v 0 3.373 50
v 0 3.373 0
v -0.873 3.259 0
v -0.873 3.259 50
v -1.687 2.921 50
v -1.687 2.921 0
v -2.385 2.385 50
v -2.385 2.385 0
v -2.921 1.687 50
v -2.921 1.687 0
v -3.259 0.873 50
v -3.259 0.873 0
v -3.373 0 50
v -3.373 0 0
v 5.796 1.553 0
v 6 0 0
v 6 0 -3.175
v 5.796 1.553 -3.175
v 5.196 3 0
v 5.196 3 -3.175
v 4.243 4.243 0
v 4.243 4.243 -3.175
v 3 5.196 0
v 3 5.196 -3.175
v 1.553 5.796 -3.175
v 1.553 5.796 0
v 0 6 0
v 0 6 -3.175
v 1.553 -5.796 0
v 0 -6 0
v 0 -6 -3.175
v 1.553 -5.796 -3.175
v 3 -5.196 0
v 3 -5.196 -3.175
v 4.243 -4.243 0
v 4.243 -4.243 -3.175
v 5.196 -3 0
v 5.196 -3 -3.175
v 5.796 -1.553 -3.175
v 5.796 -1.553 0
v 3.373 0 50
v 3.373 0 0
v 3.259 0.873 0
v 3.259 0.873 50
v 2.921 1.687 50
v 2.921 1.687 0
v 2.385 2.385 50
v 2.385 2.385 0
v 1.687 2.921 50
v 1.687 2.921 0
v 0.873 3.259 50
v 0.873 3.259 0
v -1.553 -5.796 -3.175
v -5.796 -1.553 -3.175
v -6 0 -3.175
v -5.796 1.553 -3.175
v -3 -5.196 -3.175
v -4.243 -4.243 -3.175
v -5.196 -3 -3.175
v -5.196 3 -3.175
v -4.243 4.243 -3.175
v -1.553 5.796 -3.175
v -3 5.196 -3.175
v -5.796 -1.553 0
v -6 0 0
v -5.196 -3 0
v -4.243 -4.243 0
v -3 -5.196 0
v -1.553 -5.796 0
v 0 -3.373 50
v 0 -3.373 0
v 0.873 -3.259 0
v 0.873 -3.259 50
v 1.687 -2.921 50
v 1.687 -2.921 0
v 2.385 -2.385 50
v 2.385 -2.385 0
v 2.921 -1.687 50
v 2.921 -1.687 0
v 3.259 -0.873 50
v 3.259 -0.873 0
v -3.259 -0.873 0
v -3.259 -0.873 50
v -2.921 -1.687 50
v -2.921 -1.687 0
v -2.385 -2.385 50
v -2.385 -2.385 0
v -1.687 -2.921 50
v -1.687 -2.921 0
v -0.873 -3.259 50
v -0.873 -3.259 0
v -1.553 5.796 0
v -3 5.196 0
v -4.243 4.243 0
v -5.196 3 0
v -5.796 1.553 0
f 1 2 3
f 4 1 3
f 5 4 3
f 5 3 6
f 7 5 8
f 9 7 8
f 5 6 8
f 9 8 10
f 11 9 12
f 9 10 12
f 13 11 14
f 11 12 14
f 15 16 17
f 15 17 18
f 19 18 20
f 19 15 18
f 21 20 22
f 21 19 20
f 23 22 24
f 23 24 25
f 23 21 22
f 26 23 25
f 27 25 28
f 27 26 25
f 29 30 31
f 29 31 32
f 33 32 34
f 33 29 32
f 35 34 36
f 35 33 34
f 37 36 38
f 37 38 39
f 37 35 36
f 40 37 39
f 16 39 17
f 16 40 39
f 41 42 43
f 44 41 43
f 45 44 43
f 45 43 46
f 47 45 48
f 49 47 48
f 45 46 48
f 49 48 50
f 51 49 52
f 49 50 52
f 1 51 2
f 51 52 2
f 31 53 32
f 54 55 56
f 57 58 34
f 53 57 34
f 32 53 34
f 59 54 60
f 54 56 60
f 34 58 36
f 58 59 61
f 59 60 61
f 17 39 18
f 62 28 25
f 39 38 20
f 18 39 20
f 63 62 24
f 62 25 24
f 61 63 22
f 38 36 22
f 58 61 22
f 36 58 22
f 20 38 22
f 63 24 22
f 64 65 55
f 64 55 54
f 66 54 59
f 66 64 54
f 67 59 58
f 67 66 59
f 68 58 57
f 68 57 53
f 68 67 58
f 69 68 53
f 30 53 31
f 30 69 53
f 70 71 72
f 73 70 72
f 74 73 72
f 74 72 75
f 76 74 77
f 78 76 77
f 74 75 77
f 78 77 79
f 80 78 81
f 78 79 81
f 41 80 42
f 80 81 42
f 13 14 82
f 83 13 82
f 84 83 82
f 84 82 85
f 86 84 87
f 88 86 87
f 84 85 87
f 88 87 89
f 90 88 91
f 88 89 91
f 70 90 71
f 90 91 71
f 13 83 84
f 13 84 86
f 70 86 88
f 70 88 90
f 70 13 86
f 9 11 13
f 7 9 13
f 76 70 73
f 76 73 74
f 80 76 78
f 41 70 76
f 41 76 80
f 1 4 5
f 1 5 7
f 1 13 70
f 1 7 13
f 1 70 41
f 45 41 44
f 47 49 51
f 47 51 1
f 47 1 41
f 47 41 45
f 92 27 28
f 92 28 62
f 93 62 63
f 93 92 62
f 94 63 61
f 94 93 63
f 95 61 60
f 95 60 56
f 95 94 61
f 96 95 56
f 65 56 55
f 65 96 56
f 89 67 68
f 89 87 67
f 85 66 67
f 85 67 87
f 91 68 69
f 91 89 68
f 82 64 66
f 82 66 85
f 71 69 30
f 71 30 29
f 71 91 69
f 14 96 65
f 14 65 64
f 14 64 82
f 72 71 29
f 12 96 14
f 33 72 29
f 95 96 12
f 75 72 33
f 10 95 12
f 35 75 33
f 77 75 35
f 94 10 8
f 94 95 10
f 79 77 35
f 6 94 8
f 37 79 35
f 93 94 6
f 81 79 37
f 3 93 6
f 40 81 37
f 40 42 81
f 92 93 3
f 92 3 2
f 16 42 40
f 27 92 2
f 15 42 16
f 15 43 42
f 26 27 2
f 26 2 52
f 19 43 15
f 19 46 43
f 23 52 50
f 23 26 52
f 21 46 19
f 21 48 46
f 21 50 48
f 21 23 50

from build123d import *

# Parameters (mm, degrees)
F1_DEPTH = 3.175
F3_DEPTH = 50


with BuildPart() as f1:
    # F0 (on Top) → F1 (new body)
    with BuildSketch(Plane.XY):
        with BuildLine():
            Line((0, 3.37345), (0, 6))
            ThreePointArc((0, 6), (-4.2426406871, 4.2426406871), (-6, 0))
            Line((-6, 0), (-3.37345, 0))
            ThreePointArc((-3.37345, 0), (-2.385389371, 2.385389371), (0, 3.37345))
        make_face()
        with BuildLine():
            Line((0, 0), (0, 3.37345))
            ThreePointArc((0, 3.37345), (-2.385389371, 2.385389371), (-3.37345, 0))
            Line((-3.37345, 0), (0, 0))
        make_face()
        with BuildLine():
            ThreePointArc((3.37345, 0), (2.385389371, 2.385389371), (0, 3.37345))
            Line((0, 3.37345), (0, 0))
            Line((0, 0), (3.37345, 0))
        make_face()
        with BuildLine():
            ThreePointArc((6, 0), (4.2426406871, 4.2426406871), (0, 6))
            Line((0, 6), (0, 3.37345))
            ThreePointArc((0, 3.37345), (2.385389371, 2.385389371), (3.37345, 0))
            Line((3.37345, 0), (6, 0))
        make_face()
        with BuildLine():
            ThreePointArc((0, -6), (4.2426406871, -4.2426406871), (6, 0))
            Line((6, 0), (3.37345, 0))
            ThreePointArc((3.37345, 0), (2.385389371, -2.385389371), (0, -3.37345))
            Line((0, -3.37345), (0, -6))
        make_face()
        with BuildLine():
            Line((3.37345, 0), (0, 0))
            Line((0, 0), (0, -3.37345))
            ThreePointArc((0, -3.37345), (2.385389371, -2.385389371), (3.37345, 0))
        make_face()
        with BuildLine():
            Line((0, -3.37345), (0, 0))
            Line((0, 0), (-3.37345, 0))
            ThreePointArc((-3.37345, 0), (-2.385389371, -2.385389371), (0, -3.37345))
        make_face()
        with BuildLine():
            Line((-3.37345, 0), (-6, 0))
            ThreePointArc((-6, 0), (-4.2426406871, -4.2426406871), (0, -6))
            Line((0, -6), (0, -3.37345))
            ThreePointArc((0, -3.37345), (-2.385389371, -2.385389371), (-3.37345, 0))
        make_face()
    extrude(amount=-F1_DEPTH)

    # F2 (on Top) → F3 (join)
    with BuildSketch(Plane.XY):
        with BuildLine():
            ThreePointArc((3.37345, 0), (2.385389371, 2.385389371), (0, 3.37345))
            Line((0, 3.37345), (0, 0))
            Line((0, 0), (3.37345, 0))
        make_face()
        with BuildLine():
            Line((3.37345, 0), (0, 0))
            Line((0, 0), (0, -3.37345))
            ThreePointArc((0, -3.37345), (2.385389371, -2.385389371), (3.37345, 0))
        make_face()
        with BuildLine():
            Line((0, -3.37345), (0, 0))
            Line((0, 0), (-3.37345, 0))
            ThreePointArc((-3.37345, 0), (-2.385389371, -2.385389371), (0, -3.37345))
        make_face()
        with BuildLine():
            Line((0, 0), (0, 3.37345))
            ThreePointArc((0, 3.37345), (-2.385389371, 2.385389371), (-3.37345, 0))
            Line((-3.37345, 0), (0, 0))
        make_face()
    extrude(amount=F3_DEPTH)


solid = f1.part
